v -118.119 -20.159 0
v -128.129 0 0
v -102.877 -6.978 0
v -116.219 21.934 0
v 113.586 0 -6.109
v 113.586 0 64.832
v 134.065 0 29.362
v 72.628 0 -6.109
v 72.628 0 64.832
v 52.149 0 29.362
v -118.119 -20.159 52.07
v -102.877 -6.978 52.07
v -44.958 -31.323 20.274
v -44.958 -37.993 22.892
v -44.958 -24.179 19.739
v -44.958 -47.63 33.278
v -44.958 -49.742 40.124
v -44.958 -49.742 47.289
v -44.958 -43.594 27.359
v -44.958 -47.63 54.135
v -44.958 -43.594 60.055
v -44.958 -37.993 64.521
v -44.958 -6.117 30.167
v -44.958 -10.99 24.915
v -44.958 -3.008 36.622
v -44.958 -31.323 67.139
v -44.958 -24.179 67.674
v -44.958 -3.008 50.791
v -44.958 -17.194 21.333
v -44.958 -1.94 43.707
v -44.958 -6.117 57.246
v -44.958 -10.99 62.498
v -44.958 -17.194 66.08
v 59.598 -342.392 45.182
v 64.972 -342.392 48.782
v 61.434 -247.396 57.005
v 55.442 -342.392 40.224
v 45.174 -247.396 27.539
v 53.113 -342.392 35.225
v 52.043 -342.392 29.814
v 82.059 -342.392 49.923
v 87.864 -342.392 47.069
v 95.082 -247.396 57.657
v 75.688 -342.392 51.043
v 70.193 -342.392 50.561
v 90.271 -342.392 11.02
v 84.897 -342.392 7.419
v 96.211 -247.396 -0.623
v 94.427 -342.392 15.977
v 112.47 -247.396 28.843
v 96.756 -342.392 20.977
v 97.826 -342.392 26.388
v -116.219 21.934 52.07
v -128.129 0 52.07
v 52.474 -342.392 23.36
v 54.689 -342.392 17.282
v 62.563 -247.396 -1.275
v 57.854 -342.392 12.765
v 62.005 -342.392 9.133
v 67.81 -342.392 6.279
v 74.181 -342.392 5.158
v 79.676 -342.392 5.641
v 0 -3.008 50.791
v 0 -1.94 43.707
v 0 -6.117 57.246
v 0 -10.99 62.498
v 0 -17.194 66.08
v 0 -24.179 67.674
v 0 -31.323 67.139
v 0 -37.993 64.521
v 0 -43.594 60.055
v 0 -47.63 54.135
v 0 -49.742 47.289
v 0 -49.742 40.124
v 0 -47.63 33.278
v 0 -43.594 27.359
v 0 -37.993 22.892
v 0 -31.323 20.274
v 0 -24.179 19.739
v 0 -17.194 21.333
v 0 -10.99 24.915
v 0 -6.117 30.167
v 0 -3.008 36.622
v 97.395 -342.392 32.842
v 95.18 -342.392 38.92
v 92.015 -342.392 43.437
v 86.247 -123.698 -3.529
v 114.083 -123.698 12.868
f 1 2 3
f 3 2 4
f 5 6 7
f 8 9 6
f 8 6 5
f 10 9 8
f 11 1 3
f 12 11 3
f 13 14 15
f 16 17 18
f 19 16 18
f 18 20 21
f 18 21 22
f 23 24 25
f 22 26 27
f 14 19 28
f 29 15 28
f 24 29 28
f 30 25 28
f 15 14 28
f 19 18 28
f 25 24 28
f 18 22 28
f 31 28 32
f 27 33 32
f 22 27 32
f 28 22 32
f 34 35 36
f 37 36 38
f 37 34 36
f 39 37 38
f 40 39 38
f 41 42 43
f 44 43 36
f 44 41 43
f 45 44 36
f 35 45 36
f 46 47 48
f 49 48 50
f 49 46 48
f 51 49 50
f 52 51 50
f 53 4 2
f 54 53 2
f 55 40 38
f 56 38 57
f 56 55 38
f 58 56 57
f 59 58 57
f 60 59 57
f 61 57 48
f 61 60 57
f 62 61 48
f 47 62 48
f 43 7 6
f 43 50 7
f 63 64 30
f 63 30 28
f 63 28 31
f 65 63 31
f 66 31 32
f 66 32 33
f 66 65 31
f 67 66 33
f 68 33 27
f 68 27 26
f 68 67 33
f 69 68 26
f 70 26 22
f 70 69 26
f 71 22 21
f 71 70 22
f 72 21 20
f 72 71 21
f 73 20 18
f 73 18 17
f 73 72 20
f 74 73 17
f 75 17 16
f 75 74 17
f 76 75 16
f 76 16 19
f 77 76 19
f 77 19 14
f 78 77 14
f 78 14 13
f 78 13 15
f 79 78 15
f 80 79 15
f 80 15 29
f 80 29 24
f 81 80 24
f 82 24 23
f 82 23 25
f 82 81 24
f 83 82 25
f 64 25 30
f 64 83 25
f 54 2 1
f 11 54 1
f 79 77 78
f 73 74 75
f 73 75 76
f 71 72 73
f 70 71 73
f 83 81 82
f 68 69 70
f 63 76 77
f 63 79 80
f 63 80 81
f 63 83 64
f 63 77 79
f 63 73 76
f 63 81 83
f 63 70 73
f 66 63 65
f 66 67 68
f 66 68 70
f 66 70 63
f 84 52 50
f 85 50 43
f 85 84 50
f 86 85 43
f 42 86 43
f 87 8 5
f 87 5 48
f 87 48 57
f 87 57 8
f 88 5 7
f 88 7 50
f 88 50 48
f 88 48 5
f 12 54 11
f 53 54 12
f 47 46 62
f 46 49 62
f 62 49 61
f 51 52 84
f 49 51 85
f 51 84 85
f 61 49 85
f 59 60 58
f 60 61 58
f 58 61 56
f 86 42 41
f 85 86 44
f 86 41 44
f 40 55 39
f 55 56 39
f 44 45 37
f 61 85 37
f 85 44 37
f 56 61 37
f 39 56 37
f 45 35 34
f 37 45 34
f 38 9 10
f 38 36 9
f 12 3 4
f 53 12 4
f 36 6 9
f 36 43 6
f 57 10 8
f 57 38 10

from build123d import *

# Parameters (mm, degrees)
F1_DEPTH = 52.07
F2_R     = 24.0348564639
F3_DEPTH = 44.958


# Not quite as in the source:
# - the arcs of a loft's sections are written as splines that run evenly, so that the points pair up as in the source's solid


with BuildPart() as f1:
    # F0 (on Top) → F1 (new body)
    with BuildSketch(Plane.XY):
        Polygon((-128.12936306, 0), (-118.1188970804, -20.1593339443), (-102.8770580888, -6.9779586047), (-116.2189766765, 21.9337996095), align=None)
    extrude(amount=F1_DEPTH)


with BuildPart() as f3:
    # F2 (on Right) → F3 (new body)
    with BuildSketch(Plane.YZ):
        with Locations((-25.9751360863, 43.7066555023)):
            Circle(F2_R)
    extrude(amount=-F3_DEPTH)


with BuildPart() as f7:
    # F4 (on Front) → F7 section 0
    with BuildSketch(Plane.XZ):
        Polygon((113.5863239066, 64.8323372006), (72.628227423, 64.8323372006), (52.1491791811, 29.3615851551), (72.628227423, -6.1091668904), (113.5863239066, -6.1091668904), (134.0653721485, 29.3615851551), align=None)
    # F6 (on offset) → F7 section 1
    with BuildSketch(Plane.XZ.offset(247.396)):
        Polygon((112.4704657081, 28.843481159), (95.0816841837, 57.6574466469), (61.4336673252, 57.0053028498), (45.1744319912, 27.5391935648), (62.5632135156, -1.274771923), (96.2112303741, -0.6226281259), align=None)
    loft()

    # F7_face (on face) → F10 section 0
    with BuildSketch(Plane(origin=(78.8224488497, -247.396, 28.1913373619), x_dir=(1, 0, 0), z_dir=(0, -1, 0))):
        Polygon((33.6480168585, 0.6521437971), (16.259235334, 29.4661092849), (-17.3887815244, 28.8139654879), (-33.6480168585, -0.6521437971), (-16.259235334, -29.4661092849), (17.3887815244, -28.8139654879), align=None)
    # F9 (on offset) → F10 section 1
    with BuildSketch(Plane.XZ.offset(342.392)):
        with BuildLine():
            add(Edge.make_bspline(
                [(87.8640765562, 47.0690177587), (85.6570363119, 48.5734477992), (83.1853326809, 49.6884427268), (78.0083630622, 51.0061419006), (75.3043706745, 51.2085219762), (69.9889308654, 50.6761262752), (67.3787911096, 49.9414814748), (64.9723963541, 48.7823435763)],
                knots=[0, 0, 0, 0, 0.3333333333, 0.3333333333, 0.6666666667, 0.6666666667, 1, 1, 1, 1], degree=3))
            add(Edge.make_bspline(
                [(64.9723963541, 48.7823435763), (62.5660015987, 47.6232056779), (60.3645358508, 46.0401450066), (56.6348900825, 42.2156073891), (55.1076276019, 39.9750713274), (52.9109758993, 35.1055675701), (52.2421270813, 32.4777978338), (52.0427725701, 29.8142298949)],
                knots=[0, 0, 0, 0, 0.3333333333, 0.3333333333, 0.6666666667, 0.6666666667, 1, 1, 1, 1], degree=3))
            add(Edge.make_bspline(
                [(52.0427725701, 29.8142298949), (51.843418059, 27.150661956), (52.1136559421, 24.4526063571), (53.5609797924, 19.3103695658), (54.7377096996, 16.8674534286), (57.856497806, 12.5303453722), (59.7977887439, 10.6372204364), (62.0048289881, 9.1327903958)],
                knots=[0, 0, 0, 0, 0.3333333333, 0.3333333333, 0.6666666667, 0.6666666667, 1, 1, 1, 1], degree=3))
            add(Edge.make_bspline(
                [(62.0048289881, 9.1327903958), (64.2118692324, 7.6283603553), (66.6835728634, 6.5133654277), (71.8605424821, 5.195666254), (74.5645348698, 4.9932861784), (79.8799746788, 5.5256818794), (82.4901144347, 6.2603266798), (84.8965091901, 7.4194645782)],
                knots=[0, 0, 0, 0, 0.3333333333, 0.3333333333, 0.6666666667, 0.6666666667, 1, 1, 1, 1], degree=3))
            add(Edge.make_bspline(
                [(84.8965091901, 7.4194645782), (87.3029039455, 8.5786024767), (89.5043696934, 10.1616631479), (93.2340154618, 13.9862007655), (94.7612779424, 16.2267368271), (96.957929645, 21.0962405845), (97.626778463, 23.7240103208), (97.8261329741, 26.3875782597)],
                knots=[0, 0, 0, 0, 0.3333333333, 0.3333333333, 0.6666666667, 0.6666666667, 1, 1, 1, 1], degree=3))
            add(Edge.make_bspline(
                [(97.8261329741, 26.3875782597), (98.0254874853, 29.0511461986), (97.7552496022, 31.7492017975), (96.3079257519, 36.8914385888), (95.1311958447, 39.334354726), (92.0124077383, 43.6714627824), (90.0711168004, 45.5645877182), (87.8640765562, 47.0690177587)],
                knots=[0, 0, 0, 0, 0.3333333333, 0.3333333333, 0.6666666667, 0.6666666667, 1, 1, 1, 1], degree=3))
        make_face()
    loft(ruled=True)


solid = Compound([f1.part, f3.part, f7.part])
